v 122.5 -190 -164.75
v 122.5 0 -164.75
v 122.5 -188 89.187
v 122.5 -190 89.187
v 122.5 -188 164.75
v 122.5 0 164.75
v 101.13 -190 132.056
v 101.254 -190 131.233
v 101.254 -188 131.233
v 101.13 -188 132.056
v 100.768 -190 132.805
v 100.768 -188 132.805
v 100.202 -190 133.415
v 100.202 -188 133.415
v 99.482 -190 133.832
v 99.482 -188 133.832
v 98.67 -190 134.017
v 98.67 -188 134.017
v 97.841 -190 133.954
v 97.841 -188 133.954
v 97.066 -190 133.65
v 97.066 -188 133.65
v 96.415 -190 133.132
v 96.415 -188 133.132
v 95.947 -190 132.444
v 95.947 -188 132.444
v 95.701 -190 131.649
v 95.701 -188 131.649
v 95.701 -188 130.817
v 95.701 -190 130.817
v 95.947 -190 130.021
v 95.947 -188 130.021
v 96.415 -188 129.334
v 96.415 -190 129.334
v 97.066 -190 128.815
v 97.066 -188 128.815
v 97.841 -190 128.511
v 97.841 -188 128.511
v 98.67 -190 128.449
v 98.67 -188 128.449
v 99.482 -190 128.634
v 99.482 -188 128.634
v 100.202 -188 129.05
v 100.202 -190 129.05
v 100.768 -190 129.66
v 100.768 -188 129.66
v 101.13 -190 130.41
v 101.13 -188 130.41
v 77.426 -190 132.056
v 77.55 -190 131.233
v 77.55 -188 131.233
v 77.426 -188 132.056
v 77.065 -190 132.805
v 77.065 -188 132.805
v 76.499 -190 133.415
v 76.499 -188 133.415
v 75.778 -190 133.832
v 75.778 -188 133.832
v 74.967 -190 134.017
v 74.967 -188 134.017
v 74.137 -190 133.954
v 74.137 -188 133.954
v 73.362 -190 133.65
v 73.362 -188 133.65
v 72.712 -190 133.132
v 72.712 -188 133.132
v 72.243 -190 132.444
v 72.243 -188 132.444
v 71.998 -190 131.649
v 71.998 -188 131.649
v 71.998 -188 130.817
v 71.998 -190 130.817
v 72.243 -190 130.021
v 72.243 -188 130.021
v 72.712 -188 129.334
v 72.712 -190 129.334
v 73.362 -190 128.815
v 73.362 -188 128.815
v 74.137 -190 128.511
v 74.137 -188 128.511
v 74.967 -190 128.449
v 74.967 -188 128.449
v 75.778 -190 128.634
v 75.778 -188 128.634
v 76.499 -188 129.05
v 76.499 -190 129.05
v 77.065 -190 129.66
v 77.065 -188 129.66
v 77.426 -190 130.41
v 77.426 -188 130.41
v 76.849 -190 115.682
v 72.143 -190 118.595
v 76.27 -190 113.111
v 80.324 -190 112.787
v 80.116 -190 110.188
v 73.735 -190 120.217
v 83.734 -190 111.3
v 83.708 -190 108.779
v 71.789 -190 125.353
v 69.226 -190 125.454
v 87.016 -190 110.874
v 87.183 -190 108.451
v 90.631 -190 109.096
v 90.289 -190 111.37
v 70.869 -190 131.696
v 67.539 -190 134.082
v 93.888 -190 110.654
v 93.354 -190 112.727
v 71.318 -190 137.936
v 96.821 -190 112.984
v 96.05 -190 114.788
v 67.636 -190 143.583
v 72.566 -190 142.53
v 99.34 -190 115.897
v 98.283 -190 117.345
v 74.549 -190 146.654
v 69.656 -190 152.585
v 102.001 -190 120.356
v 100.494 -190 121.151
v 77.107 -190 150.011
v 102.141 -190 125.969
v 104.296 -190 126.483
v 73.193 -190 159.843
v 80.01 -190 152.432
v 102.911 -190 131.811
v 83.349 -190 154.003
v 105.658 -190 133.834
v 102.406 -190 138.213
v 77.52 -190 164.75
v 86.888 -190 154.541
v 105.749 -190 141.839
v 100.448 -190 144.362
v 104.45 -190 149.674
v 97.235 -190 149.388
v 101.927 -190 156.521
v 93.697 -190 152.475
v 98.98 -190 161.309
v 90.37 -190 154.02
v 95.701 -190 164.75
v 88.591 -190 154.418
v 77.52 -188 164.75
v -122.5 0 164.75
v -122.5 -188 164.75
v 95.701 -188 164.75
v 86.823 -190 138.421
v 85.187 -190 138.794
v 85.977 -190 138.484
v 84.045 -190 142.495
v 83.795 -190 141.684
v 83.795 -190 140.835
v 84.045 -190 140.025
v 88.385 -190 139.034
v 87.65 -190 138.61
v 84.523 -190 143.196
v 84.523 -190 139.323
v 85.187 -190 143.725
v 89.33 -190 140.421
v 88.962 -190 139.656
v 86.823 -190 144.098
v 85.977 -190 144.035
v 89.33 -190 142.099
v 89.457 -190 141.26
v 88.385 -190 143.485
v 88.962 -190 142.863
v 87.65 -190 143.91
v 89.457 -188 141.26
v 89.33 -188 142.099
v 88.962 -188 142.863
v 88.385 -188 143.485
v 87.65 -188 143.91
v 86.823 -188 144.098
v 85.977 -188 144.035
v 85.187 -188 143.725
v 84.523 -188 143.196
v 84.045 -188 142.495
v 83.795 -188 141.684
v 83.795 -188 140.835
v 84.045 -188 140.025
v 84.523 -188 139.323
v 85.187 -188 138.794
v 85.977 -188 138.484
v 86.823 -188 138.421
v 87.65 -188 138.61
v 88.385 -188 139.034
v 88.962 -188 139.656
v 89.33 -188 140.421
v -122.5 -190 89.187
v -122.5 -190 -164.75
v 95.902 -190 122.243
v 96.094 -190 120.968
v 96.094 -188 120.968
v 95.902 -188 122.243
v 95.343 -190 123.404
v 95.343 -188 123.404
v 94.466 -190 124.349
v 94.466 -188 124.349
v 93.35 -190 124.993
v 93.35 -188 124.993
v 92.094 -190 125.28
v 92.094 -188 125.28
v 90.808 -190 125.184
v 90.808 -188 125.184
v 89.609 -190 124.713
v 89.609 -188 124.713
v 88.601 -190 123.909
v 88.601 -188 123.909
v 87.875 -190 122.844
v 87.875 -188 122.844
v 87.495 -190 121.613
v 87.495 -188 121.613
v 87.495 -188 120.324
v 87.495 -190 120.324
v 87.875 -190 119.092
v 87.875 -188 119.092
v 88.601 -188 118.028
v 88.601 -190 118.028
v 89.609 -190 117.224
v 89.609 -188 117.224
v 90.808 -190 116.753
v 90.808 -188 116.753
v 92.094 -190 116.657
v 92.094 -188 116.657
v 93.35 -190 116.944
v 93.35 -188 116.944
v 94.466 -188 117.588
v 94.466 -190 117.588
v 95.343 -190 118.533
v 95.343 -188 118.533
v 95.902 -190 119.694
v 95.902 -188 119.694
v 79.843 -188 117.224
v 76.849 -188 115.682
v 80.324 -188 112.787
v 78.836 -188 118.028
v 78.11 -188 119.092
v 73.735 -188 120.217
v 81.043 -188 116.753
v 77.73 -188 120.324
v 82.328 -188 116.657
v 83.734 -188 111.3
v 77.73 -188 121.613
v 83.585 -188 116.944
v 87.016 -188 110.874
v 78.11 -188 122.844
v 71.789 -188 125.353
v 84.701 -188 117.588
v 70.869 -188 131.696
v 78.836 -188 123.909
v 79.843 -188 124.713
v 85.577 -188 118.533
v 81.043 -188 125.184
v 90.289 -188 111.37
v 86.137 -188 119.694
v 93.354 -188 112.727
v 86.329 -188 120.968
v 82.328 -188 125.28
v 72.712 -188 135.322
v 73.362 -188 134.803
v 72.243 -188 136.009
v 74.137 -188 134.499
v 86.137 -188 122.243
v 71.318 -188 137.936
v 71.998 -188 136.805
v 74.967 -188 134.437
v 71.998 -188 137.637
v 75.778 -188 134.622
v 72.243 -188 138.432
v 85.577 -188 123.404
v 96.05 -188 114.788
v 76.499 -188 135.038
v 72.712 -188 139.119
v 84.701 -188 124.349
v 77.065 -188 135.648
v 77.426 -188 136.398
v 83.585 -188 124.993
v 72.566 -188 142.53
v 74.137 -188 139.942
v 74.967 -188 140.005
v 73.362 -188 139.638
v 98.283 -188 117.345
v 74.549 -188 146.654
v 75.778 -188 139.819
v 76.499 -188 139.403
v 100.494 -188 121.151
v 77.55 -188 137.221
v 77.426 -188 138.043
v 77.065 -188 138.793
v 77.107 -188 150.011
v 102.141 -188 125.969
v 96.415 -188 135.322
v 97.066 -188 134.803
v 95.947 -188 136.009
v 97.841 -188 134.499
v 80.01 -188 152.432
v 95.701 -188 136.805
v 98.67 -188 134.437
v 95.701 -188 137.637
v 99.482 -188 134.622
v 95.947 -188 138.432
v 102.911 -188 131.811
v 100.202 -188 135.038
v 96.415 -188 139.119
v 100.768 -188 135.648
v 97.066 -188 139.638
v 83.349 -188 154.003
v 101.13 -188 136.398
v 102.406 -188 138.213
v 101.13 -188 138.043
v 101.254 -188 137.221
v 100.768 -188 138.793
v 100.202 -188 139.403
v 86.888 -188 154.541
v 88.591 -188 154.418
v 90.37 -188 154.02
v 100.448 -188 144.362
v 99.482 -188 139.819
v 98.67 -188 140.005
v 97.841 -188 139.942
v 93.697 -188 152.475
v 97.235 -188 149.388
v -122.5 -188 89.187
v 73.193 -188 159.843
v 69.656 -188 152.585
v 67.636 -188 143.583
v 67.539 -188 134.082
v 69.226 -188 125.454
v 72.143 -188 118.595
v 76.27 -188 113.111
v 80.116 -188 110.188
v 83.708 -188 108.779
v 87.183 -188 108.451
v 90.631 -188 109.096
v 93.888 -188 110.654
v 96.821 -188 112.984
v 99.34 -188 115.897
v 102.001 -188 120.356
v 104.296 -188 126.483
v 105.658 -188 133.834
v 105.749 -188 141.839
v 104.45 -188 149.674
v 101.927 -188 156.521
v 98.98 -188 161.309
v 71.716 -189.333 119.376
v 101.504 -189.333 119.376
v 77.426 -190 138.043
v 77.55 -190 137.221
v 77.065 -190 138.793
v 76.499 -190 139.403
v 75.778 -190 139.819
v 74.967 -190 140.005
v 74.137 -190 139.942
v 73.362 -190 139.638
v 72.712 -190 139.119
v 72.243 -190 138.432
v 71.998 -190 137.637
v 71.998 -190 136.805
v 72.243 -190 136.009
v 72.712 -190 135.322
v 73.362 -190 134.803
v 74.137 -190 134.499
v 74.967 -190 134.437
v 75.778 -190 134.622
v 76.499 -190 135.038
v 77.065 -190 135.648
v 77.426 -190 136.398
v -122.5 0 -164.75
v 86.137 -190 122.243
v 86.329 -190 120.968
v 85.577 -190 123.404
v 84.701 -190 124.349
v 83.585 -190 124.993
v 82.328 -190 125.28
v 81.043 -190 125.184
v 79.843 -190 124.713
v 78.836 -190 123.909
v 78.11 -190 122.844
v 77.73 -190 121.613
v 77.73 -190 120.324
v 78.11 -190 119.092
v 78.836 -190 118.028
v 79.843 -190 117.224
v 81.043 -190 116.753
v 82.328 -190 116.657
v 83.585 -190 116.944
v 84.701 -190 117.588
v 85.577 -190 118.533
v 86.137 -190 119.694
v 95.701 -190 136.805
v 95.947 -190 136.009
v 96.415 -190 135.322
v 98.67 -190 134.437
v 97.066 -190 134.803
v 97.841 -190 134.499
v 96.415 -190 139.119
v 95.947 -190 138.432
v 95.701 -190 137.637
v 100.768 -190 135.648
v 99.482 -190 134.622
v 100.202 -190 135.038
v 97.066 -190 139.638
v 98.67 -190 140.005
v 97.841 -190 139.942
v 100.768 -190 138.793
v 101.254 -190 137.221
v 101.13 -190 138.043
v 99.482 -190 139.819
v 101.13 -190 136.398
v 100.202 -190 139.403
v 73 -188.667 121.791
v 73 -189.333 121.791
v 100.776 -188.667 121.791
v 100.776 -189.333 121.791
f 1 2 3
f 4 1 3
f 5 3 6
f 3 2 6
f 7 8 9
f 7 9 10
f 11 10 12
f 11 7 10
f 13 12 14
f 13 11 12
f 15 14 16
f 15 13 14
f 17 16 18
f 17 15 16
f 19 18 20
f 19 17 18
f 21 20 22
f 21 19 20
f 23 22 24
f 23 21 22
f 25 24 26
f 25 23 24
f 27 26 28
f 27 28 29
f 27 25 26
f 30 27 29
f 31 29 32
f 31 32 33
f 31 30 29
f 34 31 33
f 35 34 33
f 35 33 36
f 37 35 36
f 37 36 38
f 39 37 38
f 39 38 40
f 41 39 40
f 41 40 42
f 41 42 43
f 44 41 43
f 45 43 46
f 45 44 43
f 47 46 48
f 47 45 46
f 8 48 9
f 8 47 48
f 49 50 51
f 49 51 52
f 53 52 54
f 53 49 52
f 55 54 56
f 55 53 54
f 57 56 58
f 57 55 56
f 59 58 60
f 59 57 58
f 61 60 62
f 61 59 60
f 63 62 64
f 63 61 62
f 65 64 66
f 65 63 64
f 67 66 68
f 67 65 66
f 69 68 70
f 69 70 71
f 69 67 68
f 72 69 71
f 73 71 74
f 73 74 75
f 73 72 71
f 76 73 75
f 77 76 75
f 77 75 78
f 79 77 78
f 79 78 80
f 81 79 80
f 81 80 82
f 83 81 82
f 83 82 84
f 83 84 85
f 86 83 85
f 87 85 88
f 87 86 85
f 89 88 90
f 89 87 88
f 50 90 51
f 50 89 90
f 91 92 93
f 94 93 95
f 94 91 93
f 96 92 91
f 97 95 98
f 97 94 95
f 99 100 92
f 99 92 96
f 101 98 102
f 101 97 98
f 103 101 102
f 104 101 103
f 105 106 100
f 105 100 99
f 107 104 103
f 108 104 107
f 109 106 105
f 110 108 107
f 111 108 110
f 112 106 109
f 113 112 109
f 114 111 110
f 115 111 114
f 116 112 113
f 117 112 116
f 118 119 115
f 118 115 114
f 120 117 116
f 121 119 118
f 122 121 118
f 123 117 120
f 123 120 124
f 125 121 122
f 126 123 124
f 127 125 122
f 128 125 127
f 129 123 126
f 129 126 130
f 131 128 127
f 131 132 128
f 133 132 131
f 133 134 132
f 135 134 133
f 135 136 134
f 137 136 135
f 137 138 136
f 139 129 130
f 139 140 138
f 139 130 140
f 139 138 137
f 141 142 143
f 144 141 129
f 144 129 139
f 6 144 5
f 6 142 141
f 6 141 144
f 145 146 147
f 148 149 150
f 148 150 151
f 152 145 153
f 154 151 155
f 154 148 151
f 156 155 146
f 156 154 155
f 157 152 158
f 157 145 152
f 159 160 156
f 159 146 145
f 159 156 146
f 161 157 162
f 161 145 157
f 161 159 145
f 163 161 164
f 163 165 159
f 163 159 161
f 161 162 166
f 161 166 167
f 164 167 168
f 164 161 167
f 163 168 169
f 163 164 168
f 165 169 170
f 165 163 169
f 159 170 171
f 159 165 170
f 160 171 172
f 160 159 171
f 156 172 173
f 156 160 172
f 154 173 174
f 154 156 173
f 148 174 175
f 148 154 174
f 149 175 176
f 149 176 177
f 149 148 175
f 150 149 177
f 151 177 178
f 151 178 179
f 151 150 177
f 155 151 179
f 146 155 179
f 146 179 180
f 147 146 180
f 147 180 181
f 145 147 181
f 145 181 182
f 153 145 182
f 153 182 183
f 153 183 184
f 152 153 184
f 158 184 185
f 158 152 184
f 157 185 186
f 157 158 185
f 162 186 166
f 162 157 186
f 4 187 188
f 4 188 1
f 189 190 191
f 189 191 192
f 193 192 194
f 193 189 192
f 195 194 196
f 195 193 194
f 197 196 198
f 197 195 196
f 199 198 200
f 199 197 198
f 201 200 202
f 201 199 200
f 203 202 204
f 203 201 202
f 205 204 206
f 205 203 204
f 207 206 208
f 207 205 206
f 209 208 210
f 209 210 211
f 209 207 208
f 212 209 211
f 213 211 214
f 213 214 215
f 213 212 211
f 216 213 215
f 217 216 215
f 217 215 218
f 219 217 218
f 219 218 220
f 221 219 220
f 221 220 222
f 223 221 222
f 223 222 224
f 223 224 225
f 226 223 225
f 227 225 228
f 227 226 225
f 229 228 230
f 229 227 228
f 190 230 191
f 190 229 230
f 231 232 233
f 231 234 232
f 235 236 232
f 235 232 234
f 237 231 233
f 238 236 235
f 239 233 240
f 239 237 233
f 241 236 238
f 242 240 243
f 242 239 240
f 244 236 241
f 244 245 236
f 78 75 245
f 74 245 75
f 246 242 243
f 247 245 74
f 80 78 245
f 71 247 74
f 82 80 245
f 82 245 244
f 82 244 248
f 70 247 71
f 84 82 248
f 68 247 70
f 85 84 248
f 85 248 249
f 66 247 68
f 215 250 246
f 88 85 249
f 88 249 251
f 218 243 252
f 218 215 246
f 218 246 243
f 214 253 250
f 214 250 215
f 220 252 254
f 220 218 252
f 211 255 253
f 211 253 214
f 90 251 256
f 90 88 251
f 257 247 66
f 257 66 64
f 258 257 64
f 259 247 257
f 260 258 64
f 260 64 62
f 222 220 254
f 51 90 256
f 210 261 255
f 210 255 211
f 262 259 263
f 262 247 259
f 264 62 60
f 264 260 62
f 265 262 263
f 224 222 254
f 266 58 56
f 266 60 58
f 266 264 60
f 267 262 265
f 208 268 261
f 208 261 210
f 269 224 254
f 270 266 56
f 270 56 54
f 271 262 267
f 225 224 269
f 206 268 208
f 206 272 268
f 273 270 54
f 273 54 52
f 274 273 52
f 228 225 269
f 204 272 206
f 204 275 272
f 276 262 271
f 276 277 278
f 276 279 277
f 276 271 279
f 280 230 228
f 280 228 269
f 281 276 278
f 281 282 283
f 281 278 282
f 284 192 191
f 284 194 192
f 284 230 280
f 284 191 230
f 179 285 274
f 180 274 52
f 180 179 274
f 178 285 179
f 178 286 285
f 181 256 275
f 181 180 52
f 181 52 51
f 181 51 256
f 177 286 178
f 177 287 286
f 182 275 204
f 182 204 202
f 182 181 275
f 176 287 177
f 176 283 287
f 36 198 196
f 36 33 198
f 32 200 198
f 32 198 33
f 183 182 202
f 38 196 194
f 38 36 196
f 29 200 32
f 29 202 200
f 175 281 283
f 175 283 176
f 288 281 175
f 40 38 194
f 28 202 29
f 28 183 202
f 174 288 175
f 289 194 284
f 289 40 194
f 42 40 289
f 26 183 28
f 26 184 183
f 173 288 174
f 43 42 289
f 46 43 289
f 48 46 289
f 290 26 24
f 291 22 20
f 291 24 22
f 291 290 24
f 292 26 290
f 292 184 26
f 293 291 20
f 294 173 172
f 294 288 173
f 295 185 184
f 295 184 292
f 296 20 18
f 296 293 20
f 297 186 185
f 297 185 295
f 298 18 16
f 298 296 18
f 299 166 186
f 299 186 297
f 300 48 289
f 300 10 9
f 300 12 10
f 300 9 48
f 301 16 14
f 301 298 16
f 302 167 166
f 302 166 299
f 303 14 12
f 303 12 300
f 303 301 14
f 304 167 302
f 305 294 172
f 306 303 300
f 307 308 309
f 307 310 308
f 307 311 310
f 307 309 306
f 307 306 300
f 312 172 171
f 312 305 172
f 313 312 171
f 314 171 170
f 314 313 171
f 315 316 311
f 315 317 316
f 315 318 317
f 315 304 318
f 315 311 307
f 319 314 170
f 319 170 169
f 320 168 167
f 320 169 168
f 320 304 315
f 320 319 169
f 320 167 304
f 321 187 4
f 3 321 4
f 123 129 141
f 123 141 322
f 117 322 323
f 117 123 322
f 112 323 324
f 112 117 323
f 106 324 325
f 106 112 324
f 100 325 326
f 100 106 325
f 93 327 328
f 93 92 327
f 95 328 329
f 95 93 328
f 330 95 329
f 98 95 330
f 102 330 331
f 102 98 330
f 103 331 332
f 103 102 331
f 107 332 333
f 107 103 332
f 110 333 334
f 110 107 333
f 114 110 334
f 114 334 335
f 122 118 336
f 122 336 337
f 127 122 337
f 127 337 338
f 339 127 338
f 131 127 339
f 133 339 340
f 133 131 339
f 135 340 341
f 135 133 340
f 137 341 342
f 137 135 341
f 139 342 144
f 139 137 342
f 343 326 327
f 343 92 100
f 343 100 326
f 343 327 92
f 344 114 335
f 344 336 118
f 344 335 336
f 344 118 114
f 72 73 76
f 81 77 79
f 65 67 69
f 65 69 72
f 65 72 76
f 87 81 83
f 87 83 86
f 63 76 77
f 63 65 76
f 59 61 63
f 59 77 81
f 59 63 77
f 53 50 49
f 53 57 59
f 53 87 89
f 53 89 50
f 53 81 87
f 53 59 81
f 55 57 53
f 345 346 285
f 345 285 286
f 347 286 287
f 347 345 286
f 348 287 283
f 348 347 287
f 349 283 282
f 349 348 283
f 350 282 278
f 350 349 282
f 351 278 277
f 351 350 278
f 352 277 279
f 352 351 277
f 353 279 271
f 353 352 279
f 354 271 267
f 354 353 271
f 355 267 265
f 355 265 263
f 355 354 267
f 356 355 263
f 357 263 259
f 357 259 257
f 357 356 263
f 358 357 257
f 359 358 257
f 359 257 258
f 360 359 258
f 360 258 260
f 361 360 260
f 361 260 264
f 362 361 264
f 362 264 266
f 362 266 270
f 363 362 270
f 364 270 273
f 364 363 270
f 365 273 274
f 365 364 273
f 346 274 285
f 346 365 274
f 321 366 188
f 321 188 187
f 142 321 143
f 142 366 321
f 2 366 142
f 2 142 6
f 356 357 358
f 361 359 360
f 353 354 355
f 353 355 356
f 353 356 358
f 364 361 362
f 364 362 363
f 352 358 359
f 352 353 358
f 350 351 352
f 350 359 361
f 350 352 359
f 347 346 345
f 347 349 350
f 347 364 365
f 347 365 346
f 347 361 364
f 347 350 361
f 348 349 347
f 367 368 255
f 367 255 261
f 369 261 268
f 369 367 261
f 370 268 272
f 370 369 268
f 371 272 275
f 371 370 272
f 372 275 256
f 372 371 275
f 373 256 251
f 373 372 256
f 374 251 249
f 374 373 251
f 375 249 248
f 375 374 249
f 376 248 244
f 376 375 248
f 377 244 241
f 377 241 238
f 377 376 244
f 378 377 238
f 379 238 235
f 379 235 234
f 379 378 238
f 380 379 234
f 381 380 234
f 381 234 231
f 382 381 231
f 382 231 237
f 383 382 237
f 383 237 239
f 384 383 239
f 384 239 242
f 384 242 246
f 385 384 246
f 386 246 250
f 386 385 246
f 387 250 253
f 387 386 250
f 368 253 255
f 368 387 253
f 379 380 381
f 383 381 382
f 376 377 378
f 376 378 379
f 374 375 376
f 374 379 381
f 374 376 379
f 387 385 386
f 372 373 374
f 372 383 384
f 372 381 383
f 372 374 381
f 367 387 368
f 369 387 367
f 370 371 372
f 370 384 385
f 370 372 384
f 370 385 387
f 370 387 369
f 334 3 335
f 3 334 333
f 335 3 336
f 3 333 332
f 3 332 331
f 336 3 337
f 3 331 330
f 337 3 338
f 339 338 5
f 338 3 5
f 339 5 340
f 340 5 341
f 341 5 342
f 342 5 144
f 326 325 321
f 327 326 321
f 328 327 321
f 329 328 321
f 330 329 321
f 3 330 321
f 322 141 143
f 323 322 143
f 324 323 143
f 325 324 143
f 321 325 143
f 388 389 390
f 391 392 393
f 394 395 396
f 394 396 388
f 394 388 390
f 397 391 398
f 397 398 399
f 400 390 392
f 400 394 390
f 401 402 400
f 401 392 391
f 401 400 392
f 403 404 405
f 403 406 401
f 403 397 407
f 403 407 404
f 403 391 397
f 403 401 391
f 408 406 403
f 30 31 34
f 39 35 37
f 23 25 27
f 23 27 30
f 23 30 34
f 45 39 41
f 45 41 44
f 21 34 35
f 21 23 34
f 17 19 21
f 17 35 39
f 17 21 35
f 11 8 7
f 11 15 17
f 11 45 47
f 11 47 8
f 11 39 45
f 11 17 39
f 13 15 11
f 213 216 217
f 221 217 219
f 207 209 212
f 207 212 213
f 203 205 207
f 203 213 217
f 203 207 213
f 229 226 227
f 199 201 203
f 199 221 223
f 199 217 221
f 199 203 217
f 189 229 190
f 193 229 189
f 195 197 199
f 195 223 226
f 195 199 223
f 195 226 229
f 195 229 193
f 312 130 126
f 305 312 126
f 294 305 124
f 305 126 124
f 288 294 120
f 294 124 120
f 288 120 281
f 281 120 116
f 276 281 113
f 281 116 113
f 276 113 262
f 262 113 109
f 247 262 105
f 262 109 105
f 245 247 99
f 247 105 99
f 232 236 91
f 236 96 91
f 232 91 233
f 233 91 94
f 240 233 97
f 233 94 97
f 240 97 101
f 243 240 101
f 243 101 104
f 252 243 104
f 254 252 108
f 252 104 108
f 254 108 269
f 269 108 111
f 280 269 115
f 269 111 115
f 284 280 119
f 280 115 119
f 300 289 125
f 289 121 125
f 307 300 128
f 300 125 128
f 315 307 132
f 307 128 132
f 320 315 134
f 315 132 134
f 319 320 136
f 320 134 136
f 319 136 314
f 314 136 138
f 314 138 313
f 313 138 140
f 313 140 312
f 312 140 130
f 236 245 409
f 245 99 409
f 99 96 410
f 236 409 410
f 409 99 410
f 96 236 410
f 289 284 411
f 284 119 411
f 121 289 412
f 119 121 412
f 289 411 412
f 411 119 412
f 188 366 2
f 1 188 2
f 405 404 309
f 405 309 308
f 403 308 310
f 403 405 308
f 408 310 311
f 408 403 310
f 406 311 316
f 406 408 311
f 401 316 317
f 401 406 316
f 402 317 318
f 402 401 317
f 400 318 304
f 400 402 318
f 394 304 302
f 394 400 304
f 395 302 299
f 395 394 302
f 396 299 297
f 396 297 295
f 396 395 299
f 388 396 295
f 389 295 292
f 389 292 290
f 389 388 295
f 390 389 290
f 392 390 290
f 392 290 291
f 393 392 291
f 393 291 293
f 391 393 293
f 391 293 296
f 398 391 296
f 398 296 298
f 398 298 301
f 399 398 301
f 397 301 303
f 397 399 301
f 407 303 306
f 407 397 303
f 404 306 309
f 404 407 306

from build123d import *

# Parameters (mm, degrees)
F0_W     = 245
F0_H     = 329.5
F1_DEPTH = 190
F2_R     = 4.3236508832
F2_R_2   = 2.7917572167
F2_R_3   = 2.8466316253
F3_DEPTH = 2


# Not quite as in the source:
# - a feature names something its author has since deleted; it is built from what else it names


with BuildPart() as f1:
    # F0 (on Front) → F1 (new body)
    with BuildSketch(Plane.XZ):
        Rectangle(F0_W, F0_H)
    extrude(amount=F1_DEPTH)

    # F2 (on face) → F3 (cut)
    with BuildSketch(Plane.XZ.offset(190)):
        with BuildLine():
            add(Edge.make_bspline(
                [(86.887806654, 154.5414891056), (59.1122539749, 154.5414891056), (73.0000303144, 121.790649185), (86.887806654, 89.0398092644), (100.7755829935, 121.790649185), (114.6633593331, 154.5414891056), (86.887806654, 154.5414891056)],
                knots=[0, 0, 0, 2.0943951024, 2.0943951024, 4.1887902048, 4.1887902048, 6.2831853072, 6.2831853072, 6.2831853072], degree=2, weights=[1, 0.5, 1, 0.5, 1, 0.5, 1]))
        make_face()
        with Locations((82.0050109178, 120.968401432)):
            Circle(F2_R, mode=Mode.SUBTRACT)
        with Locations((91.7706023902, 120.968401432)):
            Circle(F2_R, mode=Mode.SUBTRACT)
        with Locations((74.7582092881, 131.2327347696)):
            Circle(F2_R_2, mode=Mode.SUBTRACT)
        with Locations((74.7582092881, 137.2206024826)):
            Circle(F2_R_2, mode=Mode.SUBTRACT)
        with Locations((86.610019207, 141.2596870214)):
            Circle(F2_R_3, mode=Mode.SUBTRACT)
        with Locations((98.4618291259, 131.2327347696)):
            Circle(F2_R_2, mode=Mode.SUBTRACT)
        with Locations((98.4618291259, 137.2206024826)):
            Circle(F2_R_2, mode=Mode.SUBTRACT)
        with BuildLine():
            add(Edge.make_bspline(
                [(77.5195354487, 164.75), (56.8220313431, 147.5523822091), (71.7160252751, 119.3755302582), (86.610019207, 91.1986783073), (101.5040131389, 119.3755302582), (116.3980070709, 147.5523822091), (95.7005029653, 164.75)],
                knots=[0.4912762616, 0.4912762616, 0.4912762616, 2.2581538563, 2.2581538563, 4.0250314509, 4.0250314509, 5.7919090456, 5.7919090456, 5.7919090456], degree=2, weights=[1, 0.6344969674, 1, 0.6344969674, 1, 0.6344969674, 1]))
            Line((77.5195354487, 164.75), (-122.5, 164.75))
            Line((-122.5, 164.75), (-122.5, 89.1870856285))
            Line((-122.5, 89.1870856285), (122.5, 89.1870856285))
            Line((122.5, 89.1870856285), (122.5, 164.75))
            Line((122.5, 164.75), (95.7005029653, 164.75))
        make_face()
    extrude(amount=-F3_DEPTH, mode=Mode.SUBTRACT)


solid = f1.part
